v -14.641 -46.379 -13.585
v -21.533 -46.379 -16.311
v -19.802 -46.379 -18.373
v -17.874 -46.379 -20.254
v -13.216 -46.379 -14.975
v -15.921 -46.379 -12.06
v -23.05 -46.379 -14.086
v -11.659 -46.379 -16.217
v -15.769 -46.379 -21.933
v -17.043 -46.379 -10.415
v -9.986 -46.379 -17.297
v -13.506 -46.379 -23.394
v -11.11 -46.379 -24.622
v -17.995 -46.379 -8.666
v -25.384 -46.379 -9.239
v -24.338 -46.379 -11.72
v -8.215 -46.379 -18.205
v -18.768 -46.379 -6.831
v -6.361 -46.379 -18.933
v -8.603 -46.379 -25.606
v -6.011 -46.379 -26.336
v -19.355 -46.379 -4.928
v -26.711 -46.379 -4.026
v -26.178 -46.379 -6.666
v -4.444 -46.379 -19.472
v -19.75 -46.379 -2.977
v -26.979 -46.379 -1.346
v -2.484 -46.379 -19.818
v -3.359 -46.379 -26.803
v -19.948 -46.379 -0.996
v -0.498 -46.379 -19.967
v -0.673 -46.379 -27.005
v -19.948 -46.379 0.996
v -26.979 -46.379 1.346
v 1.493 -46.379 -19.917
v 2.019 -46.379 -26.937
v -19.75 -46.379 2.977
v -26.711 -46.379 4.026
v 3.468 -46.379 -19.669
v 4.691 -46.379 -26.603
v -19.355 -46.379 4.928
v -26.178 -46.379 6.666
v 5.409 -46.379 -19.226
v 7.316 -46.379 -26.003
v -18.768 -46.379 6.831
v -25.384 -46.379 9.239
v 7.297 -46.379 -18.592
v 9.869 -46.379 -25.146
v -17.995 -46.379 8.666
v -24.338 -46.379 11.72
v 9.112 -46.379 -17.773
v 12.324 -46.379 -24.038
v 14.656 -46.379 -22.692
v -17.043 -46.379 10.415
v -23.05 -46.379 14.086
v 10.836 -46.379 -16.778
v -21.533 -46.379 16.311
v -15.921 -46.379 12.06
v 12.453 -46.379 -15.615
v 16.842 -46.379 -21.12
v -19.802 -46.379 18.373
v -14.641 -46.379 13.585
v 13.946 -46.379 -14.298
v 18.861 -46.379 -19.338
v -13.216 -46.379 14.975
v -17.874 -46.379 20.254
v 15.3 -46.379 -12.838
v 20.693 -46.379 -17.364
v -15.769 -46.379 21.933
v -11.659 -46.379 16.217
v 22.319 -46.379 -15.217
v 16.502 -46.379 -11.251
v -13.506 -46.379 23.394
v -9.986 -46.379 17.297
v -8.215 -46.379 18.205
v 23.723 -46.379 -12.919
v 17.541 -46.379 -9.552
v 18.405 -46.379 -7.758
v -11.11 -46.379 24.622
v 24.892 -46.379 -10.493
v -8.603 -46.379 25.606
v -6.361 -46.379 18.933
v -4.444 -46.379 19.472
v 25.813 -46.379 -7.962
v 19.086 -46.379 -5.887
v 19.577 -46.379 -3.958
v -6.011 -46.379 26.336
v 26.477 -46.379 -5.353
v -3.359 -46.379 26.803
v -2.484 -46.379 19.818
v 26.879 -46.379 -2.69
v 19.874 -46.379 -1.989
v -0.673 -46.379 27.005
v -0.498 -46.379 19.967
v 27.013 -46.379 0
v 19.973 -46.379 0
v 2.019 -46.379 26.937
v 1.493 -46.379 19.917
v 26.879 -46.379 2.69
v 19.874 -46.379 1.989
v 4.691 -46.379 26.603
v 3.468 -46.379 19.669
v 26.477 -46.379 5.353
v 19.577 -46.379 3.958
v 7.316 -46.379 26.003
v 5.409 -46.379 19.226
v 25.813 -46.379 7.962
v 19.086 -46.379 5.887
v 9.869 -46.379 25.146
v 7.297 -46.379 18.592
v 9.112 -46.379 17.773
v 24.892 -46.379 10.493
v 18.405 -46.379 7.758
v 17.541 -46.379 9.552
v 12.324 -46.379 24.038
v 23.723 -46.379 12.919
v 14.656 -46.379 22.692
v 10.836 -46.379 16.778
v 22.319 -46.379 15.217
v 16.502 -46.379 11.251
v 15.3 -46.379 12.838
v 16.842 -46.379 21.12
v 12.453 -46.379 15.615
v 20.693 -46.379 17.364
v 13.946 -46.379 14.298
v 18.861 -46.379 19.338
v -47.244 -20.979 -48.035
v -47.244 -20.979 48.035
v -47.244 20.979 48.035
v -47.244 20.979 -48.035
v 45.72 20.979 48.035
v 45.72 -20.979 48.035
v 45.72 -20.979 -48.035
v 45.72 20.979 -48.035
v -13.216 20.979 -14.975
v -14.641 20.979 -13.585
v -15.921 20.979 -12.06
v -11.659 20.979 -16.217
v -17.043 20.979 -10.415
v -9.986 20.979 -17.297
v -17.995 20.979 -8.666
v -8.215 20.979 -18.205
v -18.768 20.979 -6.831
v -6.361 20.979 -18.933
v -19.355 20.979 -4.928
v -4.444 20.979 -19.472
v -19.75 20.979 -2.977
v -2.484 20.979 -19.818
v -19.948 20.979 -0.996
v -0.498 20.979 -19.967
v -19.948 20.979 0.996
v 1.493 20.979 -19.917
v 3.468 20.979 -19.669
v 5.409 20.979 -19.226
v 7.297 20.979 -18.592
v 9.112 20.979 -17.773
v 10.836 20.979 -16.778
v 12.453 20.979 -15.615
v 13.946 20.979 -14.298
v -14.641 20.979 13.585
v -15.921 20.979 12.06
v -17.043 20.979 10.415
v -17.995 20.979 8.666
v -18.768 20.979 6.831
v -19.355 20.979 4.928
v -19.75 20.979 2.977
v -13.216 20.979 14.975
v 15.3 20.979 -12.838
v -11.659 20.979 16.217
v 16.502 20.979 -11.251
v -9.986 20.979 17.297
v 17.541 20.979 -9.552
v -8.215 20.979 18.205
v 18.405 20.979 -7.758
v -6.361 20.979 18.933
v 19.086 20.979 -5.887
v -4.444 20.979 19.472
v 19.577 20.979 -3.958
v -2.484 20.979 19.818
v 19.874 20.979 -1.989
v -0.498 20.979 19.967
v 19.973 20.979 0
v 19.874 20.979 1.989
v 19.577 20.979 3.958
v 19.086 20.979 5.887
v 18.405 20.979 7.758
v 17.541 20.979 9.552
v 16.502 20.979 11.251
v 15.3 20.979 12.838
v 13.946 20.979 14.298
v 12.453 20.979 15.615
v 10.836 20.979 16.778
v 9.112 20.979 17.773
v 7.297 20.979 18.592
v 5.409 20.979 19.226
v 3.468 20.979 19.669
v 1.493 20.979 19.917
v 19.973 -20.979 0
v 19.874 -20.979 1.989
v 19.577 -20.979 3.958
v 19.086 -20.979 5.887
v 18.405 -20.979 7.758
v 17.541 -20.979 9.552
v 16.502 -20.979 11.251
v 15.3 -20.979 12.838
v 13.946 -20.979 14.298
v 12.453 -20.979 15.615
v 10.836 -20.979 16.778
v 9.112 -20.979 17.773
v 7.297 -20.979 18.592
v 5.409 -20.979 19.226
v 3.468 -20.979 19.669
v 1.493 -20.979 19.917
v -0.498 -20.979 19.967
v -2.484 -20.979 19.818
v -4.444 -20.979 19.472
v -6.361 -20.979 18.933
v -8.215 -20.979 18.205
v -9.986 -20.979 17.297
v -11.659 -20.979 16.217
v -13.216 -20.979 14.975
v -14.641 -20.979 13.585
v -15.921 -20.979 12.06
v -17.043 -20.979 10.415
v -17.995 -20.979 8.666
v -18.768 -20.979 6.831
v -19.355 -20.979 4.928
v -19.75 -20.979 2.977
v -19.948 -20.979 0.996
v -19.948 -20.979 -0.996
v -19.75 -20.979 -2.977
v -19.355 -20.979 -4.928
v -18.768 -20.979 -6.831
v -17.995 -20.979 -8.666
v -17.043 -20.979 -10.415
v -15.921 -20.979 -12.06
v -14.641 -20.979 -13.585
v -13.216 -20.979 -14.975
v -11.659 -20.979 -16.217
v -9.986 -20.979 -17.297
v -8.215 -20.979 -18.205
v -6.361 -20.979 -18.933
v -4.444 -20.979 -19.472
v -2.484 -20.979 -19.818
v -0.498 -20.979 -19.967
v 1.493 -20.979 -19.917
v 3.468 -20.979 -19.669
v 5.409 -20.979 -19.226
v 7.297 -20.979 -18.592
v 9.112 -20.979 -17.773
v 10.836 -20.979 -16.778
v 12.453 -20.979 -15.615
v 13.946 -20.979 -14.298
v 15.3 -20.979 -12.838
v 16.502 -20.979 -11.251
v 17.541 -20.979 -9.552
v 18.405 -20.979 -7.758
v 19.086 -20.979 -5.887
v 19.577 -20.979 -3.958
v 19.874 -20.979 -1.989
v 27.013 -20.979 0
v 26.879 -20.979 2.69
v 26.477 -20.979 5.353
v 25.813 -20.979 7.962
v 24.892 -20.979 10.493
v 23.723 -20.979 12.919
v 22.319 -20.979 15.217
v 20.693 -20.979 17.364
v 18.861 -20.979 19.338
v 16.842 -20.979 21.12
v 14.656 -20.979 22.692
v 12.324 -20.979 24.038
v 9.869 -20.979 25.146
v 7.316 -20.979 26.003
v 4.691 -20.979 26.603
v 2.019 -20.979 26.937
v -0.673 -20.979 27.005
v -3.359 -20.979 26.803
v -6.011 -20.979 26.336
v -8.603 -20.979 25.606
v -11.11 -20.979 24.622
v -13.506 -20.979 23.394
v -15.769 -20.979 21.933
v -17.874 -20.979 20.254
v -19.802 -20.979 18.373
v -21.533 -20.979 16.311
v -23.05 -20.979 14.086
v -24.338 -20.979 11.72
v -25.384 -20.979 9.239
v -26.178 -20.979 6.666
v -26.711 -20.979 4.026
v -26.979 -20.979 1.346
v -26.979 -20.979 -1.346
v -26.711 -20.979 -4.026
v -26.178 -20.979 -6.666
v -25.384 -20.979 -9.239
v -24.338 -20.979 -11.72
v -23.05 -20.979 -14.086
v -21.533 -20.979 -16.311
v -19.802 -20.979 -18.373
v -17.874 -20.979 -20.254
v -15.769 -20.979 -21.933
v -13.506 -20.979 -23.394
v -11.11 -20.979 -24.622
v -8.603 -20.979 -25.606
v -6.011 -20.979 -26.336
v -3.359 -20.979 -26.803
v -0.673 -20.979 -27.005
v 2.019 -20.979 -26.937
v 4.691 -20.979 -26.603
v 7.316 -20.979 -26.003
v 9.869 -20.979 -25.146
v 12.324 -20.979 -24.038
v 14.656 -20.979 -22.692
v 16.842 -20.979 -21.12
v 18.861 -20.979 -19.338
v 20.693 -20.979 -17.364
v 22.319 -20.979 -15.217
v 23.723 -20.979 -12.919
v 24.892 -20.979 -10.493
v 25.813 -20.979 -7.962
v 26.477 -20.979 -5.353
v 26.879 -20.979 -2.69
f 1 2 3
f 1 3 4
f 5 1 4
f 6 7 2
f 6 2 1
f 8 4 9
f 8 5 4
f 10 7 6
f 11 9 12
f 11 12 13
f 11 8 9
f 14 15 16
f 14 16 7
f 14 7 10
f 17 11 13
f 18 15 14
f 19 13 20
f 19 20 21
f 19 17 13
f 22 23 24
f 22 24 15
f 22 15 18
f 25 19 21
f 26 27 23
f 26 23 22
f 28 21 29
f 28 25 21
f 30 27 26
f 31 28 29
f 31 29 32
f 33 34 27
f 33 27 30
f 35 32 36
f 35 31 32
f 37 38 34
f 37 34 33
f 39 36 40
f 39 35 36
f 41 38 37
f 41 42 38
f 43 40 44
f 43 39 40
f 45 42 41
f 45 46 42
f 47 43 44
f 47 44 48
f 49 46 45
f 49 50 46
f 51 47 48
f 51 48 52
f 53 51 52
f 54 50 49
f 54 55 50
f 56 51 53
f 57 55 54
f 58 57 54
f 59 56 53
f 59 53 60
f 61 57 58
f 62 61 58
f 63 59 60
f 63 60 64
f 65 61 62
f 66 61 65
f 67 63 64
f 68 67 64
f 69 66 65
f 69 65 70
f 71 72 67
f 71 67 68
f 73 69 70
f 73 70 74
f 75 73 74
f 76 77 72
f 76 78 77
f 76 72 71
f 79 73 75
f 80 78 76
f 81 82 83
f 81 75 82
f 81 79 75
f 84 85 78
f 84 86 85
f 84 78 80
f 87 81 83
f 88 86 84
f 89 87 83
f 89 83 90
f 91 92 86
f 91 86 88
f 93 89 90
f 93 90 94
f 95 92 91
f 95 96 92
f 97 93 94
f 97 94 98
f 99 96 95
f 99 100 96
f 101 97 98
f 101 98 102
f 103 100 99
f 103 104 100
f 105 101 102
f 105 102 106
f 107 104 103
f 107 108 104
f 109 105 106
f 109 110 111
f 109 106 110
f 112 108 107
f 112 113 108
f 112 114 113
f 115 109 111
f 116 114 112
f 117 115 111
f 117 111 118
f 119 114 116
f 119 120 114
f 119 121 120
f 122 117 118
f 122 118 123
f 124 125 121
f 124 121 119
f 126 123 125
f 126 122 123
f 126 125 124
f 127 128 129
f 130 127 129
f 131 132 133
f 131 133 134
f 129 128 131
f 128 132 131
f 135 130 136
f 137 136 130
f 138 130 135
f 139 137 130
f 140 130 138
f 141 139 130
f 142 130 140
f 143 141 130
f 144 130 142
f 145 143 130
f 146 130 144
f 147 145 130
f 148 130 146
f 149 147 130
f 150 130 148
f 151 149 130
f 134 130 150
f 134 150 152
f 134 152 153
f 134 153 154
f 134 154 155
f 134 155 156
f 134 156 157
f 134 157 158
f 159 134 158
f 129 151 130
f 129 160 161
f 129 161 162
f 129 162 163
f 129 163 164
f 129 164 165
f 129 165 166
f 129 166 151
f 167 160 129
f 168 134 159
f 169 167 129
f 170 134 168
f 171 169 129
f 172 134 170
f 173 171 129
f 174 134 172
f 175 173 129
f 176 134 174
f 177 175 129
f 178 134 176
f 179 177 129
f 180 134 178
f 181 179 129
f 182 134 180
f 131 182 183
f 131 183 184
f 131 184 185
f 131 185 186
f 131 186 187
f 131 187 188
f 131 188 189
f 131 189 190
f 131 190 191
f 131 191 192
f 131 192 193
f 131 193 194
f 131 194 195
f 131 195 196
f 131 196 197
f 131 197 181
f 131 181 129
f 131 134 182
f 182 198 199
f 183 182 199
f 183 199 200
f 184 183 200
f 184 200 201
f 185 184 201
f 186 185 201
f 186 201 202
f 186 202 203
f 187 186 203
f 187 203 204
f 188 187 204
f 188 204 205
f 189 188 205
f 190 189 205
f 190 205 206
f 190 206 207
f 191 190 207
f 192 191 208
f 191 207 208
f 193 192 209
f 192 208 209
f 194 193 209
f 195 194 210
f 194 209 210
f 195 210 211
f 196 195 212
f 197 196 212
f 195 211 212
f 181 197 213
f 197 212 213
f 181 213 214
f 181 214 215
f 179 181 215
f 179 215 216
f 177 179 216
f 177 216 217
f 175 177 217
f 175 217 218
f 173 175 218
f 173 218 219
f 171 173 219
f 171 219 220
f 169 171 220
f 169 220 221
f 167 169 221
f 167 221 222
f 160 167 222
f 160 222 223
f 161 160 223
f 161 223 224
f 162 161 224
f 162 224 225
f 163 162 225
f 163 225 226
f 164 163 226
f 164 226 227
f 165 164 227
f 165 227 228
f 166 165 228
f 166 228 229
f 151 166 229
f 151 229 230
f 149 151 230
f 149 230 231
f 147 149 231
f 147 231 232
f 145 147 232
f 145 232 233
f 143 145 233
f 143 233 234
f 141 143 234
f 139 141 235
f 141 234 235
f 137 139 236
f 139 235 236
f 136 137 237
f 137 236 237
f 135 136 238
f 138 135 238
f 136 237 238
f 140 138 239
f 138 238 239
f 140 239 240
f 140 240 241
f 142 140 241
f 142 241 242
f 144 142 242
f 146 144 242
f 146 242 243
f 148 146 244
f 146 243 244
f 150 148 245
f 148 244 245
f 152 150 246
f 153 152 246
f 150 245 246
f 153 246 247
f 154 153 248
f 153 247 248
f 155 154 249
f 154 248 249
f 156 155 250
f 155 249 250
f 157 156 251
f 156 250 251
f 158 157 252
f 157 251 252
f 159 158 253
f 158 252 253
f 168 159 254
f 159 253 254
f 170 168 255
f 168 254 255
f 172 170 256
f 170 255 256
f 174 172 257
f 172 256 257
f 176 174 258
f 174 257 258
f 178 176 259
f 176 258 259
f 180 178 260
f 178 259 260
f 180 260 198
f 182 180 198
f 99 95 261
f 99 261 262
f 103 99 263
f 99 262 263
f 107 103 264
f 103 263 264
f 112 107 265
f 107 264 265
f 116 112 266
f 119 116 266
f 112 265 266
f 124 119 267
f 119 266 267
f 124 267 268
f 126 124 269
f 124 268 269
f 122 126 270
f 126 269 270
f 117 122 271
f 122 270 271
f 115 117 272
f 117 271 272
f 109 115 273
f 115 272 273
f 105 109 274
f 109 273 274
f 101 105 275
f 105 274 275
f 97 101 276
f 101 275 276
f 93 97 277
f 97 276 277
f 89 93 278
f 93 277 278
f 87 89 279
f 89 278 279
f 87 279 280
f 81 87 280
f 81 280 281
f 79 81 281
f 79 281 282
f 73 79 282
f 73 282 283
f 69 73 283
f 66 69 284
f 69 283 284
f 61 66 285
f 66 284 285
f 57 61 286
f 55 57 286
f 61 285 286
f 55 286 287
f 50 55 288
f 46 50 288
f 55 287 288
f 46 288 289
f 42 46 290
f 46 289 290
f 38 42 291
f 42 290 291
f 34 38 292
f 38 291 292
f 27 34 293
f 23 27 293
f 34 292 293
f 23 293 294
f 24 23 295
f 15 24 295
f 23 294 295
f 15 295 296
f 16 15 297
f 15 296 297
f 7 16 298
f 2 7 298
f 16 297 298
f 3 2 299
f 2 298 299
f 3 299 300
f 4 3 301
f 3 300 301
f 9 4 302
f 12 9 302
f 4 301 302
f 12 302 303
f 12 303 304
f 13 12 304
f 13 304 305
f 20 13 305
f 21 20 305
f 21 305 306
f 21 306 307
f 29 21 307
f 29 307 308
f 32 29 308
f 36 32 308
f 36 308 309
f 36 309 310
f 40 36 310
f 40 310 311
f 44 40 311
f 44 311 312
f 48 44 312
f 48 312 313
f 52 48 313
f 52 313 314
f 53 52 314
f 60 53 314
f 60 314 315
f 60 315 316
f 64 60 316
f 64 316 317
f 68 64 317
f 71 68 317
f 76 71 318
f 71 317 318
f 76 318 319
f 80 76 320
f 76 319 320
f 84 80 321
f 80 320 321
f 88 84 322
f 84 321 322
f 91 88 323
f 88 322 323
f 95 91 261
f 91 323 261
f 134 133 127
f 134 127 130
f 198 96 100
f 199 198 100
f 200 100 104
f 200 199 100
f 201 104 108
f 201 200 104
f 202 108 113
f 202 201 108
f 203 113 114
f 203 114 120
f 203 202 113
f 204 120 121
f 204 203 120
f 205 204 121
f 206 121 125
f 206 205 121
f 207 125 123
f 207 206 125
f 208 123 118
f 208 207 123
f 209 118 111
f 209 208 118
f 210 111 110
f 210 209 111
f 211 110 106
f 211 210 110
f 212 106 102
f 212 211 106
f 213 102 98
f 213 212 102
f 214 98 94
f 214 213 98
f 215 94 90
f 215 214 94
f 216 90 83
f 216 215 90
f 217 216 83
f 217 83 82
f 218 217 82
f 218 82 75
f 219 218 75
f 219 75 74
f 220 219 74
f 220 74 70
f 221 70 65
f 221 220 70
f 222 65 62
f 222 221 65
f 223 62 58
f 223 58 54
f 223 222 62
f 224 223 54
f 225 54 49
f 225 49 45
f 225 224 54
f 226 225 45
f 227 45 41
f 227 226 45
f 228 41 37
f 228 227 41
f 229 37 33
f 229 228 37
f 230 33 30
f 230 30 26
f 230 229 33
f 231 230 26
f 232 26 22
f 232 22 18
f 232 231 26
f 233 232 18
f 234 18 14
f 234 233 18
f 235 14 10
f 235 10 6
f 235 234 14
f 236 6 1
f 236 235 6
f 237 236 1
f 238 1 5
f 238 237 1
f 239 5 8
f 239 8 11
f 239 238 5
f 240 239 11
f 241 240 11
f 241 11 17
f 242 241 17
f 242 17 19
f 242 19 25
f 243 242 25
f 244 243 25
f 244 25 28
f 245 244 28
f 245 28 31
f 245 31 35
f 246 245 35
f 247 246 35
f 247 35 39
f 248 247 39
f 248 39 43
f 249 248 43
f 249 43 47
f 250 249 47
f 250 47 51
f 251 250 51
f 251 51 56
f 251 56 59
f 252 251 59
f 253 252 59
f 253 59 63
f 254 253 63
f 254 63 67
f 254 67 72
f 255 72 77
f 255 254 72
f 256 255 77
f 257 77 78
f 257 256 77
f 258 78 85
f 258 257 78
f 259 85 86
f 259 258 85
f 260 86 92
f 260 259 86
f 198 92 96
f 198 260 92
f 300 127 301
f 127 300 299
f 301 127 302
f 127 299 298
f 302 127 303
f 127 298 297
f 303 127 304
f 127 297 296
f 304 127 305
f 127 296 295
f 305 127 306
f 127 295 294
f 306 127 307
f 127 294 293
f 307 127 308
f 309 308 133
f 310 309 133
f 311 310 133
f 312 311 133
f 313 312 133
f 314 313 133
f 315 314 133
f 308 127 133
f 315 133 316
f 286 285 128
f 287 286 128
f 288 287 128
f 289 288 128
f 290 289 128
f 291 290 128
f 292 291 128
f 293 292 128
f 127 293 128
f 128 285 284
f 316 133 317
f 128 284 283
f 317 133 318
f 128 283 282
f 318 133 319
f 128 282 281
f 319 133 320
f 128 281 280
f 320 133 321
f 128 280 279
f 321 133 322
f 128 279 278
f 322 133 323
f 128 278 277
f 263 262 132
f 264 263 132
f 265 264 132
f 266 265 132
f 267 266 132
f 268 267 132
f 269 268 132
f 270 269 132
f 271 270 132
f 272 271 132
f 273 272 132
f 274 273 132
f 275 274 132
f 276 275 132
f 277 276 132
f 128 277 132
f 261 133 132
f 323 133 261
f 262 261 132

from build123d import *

# Parameters (mm, degrees)
F0_W     = 41.9582277536
F0_H     = 96.0698723793
F1_DEPTH = 45.72
F2_DEPTH = 47.244
F3_R     = 27.0129618135
F3_R_2   = 19.972912416
F4_DEPTH = 25.4
F5_DEPTH = 76.708


with BuildPart() as f1:
    # F0 (on Right) → F1 (new body)
    with BuildSketch(Plane.YZ):
        Rectangle(F0_W, F0_H)
    extrude(amount=F1_DEPTH)

    # F2 (add): a face of the model
    f2_faces = [f1.faces().sort_by_distance(p)[0] for p in [
        (0, 0, 0),
    ]]
    extrude(f2_faces, amount=F2_DEPTH)

    # F3 (on face) → F4 (join)
    with BuildSketch(Plane.XZ.offset(20.9791138768)):
        Circle(F3_R)
        Circle(F3_R_2, mode=Mode.SUBTRACT)
    extrude(amount=F4_DEPTH)

    # F5 (cut): a face of the model
    f5_faces = [f1.faces().sort_by_distance(p)[0] for p in [
        (0, -20.9791138768, 0),
    ]]
    extrude(f5_faces, amount=-F5_DEPTH, mode=Mode.SUBTRACT)


solid = f1.part
